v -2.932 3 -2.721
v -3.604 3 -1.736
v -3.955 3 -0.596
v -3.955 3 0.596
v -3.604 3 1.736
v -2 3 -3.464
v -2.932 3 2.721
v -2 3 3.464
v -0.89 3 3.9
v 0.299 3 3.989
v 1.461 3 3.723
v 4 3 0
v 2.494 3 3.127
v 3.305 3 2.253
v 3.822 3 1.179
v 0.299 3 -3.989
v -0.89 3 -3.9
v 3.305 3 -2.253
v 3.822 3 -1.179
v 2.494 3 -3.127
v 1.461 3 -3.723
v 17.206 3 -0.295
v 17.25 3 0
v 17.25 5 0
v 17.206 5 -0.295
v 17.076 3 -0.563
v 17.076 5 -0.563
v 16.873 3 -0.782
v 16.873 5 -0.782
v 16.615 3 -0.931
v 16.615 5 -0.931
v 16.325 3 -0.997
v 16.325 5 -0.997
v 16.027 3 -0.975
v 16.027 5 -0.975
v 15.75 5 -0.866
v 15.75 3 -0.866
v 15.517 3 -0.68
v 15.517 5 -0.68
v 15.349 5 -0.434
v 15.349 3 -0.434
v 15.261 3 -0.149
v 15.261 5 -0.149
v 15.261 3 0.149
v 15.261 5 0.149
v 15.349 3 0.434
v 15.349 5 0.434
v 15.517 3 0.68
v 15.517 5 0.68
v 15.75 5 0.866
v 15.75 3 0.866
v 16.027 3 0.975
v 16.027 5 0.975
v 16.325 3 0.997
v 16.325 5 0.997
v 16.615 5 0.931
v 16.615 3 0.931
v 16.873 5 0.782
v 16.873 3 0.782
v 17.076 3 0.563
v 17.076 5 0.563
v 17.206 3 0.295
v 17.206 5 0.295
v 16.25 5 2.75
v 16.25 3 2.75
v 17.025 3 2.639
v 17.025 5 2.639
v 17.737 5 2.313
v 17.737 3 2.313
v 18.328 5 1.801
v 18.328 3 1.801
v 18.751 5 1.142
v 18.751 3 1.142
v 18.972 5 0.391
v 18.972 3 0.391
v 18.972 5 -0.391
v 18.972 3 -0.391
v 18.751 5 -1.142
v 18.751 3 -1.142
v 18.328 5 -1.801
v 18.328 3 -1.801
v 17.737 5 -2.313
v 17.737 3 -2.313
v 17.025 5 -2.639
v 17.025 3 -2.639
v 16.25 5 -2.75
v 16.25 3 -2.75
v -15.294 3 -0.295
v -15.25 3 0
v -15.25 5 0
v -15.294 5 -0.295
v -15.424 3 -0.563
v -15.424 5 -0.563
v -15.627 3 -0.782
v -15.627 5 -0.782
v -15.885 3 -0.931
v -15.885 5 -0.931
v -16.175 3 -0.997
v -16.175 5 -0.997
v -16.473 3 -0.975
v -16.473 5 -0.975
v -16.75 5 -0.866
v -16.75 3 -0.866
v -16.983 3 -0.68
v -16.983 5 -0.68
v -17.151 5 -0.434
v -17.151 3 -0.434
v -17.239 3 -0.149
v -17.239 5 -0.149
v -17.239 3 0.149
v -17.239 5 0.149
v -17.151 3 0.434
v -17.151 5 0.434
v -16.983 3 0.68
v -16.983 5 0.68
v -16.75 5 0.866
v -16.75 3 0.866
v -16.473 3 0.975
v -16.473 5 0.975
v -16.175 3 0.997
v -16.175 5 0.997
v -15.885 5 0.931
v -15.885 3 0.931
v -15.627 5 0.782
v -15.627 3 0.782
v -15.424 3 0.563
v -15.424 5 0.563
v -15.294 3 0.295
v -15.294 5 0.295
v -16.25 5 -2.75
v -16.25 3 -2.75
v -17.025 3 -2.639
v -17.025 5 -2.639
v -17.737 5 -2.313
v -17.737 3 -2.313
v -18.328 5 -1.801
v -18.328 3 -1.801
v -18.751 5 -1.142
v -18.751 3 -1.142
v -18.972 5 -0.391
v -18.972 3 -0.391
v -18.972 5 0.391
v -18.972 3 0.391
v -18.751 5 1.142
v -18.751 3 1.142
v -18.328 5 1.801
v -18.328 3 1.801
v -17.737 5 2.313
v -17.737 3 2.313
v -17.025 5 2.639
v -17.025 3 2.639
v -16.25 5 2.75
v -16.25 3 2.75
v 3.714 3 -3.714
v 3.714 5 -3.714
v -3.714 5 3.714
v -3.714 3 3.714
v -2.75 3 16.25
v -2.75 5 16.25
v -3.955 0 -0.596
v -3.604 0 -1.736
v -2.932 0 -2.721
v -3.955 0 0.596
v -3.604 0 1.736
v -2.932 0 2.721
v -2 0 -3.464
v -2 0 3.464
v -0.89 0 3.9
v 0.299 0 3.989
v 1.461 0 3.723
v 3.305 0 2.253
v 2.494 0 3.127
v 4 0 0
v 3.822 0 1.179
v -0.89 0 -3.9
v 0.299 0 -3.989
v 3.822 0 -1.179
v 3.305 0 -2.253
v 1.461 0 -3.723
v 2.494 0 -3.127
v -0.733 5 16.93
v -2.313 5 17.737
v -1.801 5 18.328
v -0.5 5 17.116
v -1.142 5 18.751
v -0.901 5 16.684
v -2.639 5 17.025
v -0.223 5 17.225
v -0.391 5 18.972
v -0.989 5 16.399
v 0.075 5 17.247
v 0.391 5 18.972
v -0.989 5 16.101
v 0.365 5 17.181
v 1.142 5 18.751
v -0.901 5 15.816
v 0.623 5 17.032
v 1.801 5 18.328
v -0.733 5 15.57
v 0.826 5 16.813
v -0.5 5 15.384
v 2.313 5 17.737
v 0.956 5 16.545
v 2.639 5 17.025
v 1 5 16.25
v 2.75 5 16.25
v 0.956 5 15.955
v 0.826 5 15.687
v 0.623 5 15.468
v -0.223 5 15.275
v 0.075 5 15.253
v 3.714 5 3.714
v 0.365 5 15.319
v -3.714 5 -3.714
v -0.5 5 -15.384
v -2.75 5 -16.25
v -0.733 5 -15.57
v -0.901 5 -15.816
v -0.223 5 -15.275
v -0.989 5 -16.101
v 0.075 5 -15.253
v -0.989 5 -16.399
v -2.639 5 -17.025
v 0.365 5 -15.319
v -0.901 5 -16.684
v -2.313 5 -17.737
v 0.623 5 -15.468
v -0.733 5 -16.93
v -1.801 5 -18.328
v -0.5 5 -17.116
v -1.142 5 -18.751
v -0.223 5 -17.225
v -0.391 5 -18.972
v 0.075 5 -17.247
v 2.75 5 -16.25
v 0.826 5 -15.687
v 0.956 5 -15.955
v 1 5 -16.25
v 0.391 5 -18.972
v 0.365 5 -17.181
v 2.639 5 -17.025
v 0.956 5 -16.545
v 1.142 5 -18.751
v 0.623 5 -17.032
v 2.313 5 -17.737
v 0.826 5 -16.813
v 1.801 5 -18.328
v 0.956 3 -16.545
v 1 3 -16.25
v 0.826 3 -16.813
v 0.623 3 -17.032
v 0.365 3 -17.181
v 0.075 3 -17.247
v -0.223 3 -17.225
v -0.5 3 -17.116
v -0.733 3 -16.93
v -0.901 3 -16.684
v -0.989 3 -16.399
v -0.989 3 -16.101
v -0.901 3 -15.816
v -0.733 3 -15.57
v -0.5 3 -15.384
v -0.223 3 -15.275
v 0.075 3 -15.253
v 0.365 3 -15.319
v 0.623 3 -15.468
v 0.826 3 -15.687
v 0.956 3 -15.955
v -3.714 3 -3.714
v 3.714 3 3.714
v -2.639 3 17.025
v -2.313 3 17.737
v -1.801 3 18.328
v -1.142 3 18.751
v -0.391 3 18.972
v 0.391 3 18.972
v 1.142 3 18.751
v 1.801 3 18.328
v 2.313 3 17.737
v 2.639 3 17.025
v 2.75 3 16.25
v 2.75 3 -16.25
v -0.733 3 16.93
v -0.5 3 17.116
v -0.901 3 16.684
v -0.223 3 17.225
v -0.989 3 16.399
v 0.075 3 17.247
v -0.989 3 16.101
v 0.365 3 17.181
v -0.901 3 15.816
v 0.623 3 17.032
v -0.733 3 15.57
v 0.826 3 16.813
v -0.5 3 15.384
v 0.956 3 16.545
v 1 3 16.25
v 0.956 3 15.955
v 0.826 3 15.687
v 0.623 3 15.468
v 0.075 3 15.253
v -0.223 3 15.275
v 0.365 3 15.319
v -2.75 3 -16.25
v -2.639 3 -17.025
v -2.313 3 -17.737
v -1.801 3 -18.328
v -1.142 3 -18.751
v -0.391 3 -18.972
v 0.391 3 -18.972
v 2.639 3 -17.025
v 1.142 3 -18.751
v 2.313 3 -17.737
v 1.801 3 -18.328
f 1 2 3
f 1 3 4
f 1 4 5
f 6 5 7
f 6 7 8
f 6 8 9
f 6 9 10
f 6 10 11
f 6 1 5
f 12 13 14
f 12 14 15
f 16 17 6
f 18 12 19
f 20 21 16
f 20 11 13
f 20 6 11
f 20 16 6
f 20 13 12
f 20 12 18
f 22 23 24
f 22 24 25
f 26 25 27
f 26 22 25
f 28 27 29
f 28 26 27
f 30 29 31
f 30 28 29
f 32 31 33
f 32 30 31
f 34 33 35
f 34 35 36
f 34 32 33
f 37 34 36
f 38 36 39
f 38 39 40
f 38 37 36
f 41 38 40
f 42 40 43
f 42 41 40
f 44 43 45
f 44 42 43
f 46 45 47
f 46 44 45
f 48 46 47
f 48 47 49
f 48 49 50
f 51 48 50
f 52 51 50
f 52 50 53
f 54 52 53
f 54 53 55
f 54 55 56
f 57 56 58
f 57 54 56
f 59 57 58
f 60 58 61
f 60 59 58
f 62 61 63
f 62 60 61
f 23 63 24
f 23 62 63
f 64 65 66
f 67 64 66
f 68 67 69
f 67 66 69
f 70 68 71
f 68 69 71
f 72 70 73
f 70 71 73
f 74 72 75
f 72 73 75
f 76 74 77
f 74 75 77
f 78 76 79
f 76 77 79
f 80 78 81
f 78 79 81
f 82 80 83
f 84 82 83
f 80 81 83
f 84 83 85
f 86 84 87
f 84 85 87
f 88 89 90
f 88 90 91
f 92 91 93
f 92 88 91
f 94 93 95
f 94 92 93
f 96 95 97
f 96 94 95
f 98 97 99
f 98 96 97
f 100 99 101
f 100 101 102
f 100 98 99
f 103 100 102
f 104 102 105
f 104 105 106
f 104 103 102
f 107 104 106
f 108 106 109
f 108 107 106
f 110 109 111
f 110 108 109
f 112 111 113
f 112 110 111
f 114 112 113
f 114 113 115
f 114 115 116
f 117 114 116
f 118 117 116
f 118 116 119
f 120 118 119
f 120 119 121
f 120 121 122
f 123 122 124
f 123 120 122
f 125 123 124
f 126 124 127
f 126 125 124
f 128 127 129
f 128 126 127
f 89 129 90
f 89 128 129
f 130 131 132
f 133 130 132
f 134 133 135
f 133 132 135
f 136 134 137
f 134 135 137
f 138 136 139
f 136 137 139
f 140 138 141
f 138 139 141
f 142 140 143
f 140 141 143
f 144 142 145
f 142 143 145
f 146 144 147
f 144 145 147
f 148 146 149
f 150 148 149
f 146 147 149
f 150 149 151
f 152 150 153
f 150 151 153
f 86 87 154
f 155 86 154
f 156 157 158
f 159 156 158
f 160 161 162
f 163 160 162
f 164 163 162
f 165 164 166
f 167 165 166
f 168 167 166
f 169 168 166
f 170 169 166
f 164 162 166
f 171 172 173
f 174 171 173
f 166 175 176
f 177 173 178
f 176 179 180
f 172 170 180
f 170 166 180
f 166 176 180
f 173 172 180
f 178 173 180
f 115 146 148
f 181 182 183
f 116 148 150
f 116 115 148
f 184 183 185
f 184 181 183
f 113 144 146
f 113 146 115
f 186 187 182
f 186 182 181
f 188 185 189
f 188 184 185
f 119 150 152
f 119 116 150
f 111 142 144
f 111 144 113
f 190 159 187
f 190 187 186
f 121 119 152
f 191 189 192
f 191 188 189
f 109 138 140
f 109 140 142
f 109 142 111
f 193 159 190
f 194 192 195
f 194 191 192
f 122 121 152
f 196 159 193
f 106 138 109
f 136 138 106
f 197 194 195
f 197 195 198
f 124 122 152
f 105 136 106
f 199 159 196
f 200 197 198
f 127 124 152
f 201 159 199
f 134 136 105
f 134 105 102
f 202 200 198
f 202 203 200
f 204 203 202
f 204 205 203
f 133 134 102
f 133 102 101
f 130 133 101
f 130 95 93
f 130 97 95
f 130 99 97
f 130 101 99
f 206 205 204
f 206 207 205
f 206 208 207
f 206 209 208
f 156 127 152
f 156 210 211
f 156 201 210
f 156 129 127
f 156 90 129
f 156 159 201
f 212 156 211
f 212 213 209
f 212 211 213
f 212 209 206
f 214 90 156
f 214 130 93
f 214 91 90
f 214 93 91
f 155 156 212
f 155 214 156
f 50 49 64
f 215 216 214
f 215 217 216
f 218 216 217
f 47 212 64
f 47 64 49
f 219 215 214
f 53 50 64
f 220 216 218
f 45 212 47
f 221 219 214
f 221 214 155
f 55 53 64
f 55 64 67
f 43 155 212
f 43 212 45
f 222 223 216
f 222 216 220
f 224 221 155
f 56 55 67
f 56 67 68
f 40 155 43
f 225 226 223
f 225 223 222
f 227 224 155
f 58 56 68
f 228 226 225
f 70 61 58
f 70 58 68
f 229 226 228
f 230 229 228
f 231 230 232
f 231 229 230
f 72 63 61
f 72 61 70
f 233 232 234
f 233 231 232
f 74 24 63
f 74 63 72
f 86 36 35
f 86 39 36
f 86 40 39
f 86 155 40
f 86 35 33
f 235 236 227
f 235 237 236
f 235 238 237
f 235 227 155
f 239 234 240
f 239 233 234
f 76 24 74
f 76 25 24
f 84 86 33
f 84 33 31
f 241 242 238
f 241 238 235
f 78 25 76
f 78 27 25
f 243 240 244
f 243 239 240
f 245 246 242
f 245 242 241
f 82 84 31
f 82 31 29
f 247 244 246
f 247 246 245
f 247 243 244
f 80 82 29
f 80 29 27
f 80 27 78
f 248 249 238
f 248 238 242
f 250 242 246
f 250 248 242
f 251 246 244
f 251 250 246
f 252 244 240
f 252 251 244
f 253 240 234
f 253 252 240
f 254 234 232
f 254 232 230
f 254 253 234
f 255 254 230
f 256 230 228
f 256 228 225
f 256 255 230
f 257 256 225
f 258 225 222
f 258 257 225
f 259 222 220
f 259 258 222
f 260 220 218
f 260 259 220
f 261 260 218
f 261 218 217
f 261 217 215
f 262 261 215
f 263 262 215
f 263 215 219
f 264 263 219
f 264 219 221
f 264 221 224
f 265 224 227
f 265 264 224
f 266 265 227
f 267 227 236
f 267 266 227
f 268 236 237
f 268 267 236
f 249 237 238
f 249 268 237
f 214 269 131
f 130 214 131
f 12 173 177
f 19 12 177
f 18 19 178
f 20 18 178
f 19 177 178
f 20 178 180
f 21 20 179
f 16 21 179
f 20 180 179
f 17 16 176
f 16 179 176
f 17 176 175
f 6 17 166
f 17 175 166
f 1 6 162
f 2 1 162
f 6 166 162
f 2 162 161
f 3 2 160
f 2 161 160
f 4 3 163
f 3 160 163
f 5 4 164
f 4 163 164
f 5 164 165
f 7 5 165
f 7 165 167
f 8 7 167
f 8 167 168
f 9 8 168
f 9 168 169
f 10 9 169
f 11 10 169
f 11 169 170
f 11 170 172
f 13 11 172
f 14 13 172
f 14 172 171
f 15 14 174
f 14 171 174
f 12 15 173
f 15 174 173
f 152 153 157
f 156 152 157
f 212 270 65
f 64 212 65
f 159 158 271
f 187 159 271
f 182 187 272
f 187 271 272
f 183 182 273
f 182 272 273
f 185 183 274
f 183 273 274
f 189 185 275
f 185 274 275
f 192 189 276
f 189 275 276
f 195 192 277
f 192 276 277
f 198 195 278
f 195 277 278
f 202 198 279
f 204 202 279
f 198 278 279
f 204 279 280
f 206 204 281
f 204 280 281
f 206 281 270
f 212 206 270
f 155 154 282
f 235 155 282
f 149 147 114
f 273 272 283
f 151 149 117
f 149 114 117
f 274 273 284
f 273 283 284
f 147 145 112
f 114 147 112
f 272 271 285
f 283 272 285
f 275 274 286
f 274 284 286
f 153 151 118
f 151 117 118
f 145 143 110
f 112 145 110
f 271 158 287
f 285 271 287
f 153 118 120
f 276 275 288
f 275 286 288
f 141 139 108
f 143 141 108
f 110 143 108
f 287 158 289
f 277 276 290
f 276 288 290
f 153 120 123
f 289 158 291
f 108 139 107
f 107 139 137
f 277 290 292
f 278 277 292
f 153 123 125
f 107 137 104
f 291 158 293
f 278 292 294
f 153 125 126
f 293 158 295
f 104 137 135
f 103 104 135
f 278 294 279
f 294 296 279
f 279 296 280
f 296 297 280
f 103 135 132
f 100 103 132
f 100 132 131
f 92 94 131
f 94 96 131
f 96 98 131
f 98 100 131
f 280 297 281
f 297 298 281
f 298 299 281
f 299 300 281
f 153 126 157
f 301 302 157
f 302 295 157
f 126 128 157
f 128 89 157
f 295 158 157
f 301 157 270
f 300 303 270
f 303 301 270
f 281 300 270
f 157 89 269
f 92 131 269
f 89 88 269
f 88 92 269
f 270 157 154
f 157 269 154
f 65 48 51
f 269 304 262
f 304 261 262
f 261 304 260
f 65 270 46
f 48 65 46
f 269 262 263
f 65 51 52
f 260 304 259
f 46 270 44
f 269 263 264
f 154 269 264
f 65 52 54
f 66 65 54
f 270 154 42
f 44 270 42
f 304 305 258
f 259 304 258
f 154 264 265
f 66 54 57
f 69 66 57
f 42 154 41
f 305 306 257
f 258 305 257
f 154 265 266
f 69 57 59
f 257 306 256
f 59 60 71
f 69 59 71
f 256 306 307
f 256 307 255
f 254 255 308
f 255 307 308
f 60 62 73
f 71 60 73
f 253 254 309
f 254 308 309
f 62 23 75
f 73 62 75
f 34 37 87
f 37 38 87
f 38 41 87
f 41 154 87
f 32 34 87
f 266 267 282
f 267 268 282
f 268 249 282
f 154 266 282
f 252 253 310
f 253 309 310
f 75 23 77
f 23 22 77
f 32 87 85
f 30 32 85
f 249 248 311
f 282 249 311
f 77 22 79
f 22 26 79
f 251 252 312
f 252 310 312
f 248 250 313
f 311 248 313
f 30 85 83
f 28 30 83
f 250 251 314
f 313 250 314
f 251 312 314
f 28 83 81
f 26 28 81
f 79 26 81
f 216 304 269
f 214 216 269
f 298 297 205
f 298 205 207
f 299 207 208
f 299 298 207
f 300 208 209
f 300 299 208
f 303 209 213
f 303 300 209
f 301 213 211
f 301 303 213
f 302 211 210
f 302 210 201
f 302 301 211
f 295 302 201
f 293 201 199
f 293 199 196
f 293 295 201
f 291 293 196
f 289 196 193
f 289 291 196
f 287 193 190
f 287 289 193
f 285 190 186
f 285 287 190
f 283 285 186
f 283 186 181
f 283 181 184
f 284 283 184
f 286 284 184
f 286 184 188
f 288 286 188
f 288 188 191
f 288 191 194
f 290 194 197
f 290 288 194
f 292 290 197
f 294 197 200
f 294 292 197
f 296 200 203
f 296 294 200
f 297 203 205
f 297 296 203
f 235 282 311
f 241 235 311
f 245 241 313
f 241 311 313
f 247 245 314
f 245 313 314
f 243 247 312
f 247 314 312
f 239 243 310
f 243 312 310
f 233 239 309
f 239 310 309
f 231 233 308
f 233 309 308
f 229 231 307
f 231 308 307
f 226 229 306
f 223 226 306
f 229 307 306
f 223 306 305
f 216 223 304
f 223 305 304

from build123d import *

# Parameters (mm, degrees)
SKETCH1_R           = 4
BOSS_EXTRUDE1_DEPTH = 3
SKETCH2_R           = 1
BOSS_EXTRUDE3_DEPTH = 2


with BuildPart() as part:
    # Sketch1 → Boss-Extrude1 (new body)
    with BuildSketch(Plane(origin=(0, 0, 0), x_dir=(1, 0, 0), z_dir=(0, 1, 0))):
        Circle(SKETCH1_R)
    extrude(amount=BOSS_EXTRUDE1_DEPTH)


with BuildPart() as body_2:
    # Sketch2 → Boss-Extrude3 (new body)
    with BuildSketch(Plane(origin=(0, 3, 0), x_dir=(1, 0, 0), z_dir=(0, 1, 0))):
        with BuildLine():
            Line((16.25, 2.75), (3.714285714, 3.714285714))
            Line((3.714285714, 3.714285714), (2.75, 16.25))
            ThreePointArc((2.75, 16.25), (0, 19), (-2.75, 16.25))
            Line((-2.75, 16.25), (-3.714285714, 3.714285714))
            Line((-3.714285714, 3.714285714), (-16.25, 2.75))
            ThreePointArc((-16.25, 2.75), (-19, 0), (-16.25, -2.75))
            Line((-16.25, -2.75), (-3.714285714, -3.714285714))
            Line((-3.714285714, -3.714285714), (-2.75, -16.25))
            ThreePointArc((-2.75, -16.25), (0, -19), (2.75, -16.25))
            Line((2.75, -16.25), (3.714285714, -3.714285714))
            Line((3.714285714, -3.714285714), (16.25, -2.75))
            ThreePointArc((16.25, -2.75), (19, 0), (16.25, 2.75))
        make_face()
        with Locations((16.25, 0)):
            Circle(SKETCH2_R, mode=Mode.SUBTRACT)
        with Locations((0, 16.25)):
            Circle(SKETCH2_R, mode=Mode.SUBTRACT)
        with Locations((0, -16.25)):
            Circle(SKETCH2_R, mode=Mode.SUBTRACT)
        with Locations((-16.25, 0)):
            Circle(SKETCH2_R, mode=Mode.SUBTRACT)
    extrude(amount=BOSS_EXTRUDE3_DEPTH)


solid = Compound([part.part, body_2.part])
